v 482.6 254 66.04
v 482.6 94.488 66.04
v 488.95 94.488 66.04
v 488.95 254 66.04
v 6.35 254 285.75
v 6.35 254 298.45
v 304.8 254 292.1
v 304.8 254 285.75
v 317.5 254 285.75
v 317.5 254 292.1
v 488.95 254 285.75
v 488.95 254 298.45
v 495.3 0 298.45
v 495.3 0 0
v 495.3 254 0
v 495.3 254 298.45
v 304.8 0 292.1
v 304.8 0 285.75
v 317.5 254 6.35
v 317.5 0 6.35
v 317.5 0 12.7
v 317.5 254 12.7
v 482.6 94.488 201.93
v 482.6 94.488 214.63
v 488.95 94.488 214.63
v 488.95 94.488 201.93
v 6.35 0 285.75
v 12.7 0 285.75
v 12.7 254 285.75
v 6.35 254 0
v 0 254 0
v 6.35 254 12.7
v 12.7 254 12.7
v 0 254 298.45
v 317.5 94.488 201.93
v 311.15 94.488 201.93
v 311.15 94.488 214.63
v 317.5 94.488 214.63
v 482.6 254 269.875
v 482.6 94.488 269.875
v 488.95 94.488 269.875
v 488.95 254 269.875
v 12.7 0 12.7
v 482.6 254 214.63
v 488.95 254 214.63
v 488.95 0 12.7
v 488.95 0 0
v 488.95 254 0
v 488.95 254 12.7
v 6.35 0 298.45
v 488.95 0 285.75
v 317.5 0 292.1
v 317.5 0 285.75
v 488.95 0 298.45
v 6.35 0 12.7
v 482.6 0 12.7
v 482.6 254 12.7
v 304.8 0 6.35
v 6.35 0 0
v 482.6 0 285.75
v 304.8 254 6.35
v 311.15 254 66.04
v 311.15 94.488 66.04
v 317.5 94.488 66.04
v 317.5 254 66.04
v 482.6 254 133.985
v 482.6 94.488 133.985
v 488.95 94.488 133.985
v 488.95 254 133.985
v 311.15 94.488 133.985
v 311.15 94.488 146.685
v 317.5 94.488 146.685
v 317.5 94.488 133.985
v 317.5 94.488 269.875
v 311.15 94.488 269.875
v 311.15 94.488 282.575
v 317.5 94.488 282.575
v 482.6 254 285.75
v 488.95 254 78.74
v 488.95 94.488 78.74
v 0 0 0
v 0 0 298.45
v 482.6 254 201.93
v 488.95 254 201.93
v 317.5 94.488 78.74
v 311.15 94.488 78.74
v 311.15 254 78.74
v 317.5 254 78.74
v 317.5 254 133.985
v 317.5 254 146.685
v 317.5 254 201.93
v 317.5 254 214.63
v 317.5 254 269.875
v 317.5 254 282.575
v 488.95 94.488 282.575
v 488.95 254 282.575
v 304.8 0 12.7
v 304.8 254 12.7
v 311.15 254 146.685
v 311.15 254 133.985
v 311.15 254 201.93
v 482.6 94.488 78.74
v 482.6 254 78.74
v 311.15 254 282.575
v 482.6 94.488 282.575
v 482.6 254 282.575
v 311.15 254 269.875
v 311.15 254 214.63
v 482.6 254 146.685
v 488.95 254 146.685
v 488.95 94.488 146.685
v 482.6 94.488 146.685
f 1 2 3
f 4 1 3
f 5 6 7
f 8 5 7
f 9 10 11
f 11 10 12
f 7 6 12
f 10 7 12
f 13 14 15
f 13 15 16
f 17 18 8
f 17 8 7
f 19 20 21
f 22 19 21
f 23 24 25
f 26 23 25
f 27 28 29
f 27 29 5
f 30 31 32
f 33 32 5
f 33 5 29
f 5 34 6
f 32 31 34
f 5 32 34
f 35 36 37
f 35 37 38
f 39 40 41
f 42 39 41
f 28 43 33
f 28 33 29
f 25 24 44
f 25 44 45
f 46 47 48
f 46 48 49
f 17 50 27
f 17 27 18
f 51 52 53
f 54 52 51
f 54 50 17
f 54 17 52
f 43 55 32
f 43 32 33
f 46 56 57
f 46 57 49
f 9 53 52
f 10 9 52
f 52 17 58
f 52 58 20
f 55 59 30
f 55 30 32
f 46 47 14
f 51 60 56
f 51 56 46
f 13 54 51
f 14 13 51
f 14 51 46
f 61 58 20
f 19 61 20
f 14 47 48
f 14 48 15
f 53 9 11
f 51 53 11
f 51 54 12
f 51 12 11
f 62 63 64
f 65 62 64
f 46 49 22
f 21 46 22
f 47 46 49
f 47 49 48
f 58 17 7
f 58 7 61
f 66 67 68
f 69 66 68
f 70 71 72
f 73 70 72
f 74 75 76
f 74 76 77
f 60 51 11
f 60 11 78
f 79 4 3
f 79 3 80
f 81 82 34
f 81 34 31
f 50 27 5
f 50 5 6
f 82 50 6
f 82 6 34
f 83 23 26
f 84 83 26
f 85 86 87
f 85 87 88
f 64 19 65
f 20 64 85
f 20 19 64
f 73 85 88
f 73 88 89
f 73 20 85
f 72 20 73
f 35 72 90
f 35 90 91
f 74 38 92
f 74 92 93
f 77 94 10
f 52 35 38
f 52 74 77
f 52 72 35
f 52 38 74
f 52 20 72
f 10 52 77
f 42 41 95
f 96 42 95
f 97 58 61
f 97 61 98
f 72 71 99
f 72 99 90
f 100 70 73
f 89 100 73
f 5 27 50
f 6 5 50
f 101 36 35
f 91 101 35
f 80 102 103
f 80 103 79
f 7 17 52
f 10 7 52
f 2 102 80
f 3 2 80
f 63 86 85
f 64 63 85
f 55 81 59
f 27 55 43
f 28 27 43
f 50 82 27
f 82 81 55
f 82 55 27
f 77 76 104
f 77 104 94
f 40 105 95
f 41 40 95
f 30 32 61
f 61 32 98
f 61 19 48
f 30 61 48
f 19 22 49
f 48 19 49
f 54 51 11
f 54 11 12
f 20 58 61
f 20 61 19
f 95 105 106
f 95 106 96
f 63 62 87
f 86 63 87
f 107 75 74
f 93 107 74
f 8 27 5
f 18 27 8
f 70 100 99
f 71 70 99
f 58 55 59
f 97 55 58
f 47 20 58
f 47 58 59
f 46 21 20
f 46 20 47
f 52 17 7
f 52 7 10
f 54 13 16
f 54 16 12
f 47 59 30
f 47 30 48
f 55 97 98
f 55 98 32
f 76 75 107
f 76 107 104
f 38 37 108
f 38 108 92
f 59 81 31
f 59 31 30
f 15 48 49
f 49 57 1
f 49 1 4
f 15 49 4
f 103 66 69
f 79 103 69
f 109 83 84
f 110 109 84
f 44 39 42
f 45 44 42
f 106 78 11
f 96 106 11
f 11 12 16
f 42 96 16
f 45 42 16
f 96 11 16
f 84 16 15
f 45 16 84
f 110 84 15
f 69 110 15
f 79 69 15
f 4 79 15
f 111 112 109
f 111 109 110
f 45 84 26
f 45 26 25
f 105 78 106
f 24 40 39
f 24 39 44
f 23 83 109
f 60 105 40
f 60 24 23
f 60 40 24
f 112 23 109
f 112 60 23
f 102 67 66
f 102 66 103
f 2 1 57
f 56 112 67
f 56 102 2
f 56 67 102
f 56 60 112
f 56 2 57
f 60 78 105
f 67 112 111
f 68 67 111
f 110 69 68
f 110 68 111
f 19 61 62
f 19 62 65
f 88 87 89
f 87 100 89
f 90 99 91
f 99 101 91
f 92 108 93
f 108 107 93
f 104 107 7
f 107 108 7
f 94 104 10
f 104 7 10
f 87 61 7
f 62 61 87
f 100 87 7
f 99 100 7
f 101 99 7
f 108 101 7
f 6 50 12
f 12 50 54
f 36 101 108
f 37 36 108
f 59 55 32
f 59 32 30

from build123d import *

# Parameters (mm, degrees)
F2_DEPTH  = 254
F4_DEPTH  = 254
F6_DEPTH  = 254
F7_W      = 482.6
F7_H      = 12.7
F8_DEPTH  = 254
F0_W      = 12.6999982595
F0_H      = 6.35
F9_DEPTH  = 254.001
F0_H_2    = 273.05
F10_DEPTH = 254
F12_START = -94.488
F11_W     = 177.8000017405
F11_H     = 12.7
F12_DEPTH = 159.512


with BuildPart() as f2:
    # F1 (on Front) → F2 (new body)
    with BuildSketch(Plane.XZ):
        Polygon((6.35, 298.45), (0, 298.45), (0, 0), (6.35, 0), (6.35, 12.7), (12.7, 12.7), (12.7, 285.75), (6.35, 285.75), align=None)
    extrude(amount=-F2_DEPTH)


with BuildPart() as f4:
    # F3 (on Front) → F4 (new body, through all)
    with BuildSketch(Plane.XZ):
        Polygon((6.35, 12.7), (6.35, 0), (488.95, 0), (488.95, 12.7), (12.7, 12.7), align=None)
    extrude(amount=-F4_DEPTH)


with BuildPart() as f6:
    # F5 (on Front) → F6 (new body, through all)
    with BuildSketch(Plane.XZ):
        Polygon((495.3, 298.45), (488.95, 298.45), (488.95, 285.75), (482.6, 285.75), (482.6, 12.7), (488.95, 12.7), (488.95, 0), (495.3, 0), align=None)
    extrude(amount=-F6_DEPTH)


with BuildPart() as f8:
    # F7 (on Front) → F8 (new body, through all)
    with BuildSketch(Plane.XZ):
        with Locations((247.65, 292.1)):
            Rectangle(F7_W, F7_H)
    extrude(amount=-F8_DEPTH)


with BuildPart() as f9_tool:
    # F0 (on Front) → F9 (new body, through all)
    with BuildSketch(Plane.XZ):
        with Locations((311.1499991298, 288.925)):
            Rectangle(F0_W, F0_H)
        with Locations((311.1499991298, 9.525)):
            Rectangle(F0_W, F0_H)
    extrude(amount=-F9_DEPTH)


with BuildPart() as f4_1:
    add(f4.part)

    # F9: cut by f9_tool
    add(f9_tool.part, mode=Mode.SUBTRACT)


with BuildPart() as f8_1:
    add(f8.part)

    # F9: cut by f9_tool
    add(f9_tool.part, mode=Mode.SUBTRACT)


with BuildPart() as f10:
    # F0 (on Front) → F10 (new body, through all)
    with BuildSketch(Plane.XZ):
        with Locations((311.1499991298, 149.225)):
            Rectangle(F0_W, F0_H_2)
        with Locations((311.1499991298, 288.925)):
            Rectangle(F0_W, F0_H)
        with Locations((311.1499991298, 9.525)):
            Rectangle(F0_W, F0_H)
    extrude(amount=-F10_DEPTH)


with BuildPart() as f12_tool:
    # F11 (on face) → F12 (new body)
    with BuildSketch(Plane.XZ.offset(F12_START)):
        with Locations((400.0499991298, 72.39)):
            Rectangle(F11_W, F11_H)
        with Locations((400.0499991298, 140.335)):
            Rectangle(F11_W, F11_H)
        with Locations((400.0499991298, 208.28)):
            Rectangle(F11_W, F11_H)
        with Locations((400.0499991298, 276.225)):
            Rectangle(F11_W, F11_H)
    extrude(amount=-F12_DEPTH)


with BuildPart() as f6_1:
    add(f6.part)

    # F12: cut by f12_tool
    add(f12_tool.part, mode=Mode.SUBTRACT)


with BuildPart() as f10_1:
    add(f10.part)

    # F12: cut by f12_tool
    add(f12_tool.part, mode=Mode.SUBTRACT)


solid = Compound([f2.part, f4_1.part, f8_1.part, f6_1.part, f10_1.part])
